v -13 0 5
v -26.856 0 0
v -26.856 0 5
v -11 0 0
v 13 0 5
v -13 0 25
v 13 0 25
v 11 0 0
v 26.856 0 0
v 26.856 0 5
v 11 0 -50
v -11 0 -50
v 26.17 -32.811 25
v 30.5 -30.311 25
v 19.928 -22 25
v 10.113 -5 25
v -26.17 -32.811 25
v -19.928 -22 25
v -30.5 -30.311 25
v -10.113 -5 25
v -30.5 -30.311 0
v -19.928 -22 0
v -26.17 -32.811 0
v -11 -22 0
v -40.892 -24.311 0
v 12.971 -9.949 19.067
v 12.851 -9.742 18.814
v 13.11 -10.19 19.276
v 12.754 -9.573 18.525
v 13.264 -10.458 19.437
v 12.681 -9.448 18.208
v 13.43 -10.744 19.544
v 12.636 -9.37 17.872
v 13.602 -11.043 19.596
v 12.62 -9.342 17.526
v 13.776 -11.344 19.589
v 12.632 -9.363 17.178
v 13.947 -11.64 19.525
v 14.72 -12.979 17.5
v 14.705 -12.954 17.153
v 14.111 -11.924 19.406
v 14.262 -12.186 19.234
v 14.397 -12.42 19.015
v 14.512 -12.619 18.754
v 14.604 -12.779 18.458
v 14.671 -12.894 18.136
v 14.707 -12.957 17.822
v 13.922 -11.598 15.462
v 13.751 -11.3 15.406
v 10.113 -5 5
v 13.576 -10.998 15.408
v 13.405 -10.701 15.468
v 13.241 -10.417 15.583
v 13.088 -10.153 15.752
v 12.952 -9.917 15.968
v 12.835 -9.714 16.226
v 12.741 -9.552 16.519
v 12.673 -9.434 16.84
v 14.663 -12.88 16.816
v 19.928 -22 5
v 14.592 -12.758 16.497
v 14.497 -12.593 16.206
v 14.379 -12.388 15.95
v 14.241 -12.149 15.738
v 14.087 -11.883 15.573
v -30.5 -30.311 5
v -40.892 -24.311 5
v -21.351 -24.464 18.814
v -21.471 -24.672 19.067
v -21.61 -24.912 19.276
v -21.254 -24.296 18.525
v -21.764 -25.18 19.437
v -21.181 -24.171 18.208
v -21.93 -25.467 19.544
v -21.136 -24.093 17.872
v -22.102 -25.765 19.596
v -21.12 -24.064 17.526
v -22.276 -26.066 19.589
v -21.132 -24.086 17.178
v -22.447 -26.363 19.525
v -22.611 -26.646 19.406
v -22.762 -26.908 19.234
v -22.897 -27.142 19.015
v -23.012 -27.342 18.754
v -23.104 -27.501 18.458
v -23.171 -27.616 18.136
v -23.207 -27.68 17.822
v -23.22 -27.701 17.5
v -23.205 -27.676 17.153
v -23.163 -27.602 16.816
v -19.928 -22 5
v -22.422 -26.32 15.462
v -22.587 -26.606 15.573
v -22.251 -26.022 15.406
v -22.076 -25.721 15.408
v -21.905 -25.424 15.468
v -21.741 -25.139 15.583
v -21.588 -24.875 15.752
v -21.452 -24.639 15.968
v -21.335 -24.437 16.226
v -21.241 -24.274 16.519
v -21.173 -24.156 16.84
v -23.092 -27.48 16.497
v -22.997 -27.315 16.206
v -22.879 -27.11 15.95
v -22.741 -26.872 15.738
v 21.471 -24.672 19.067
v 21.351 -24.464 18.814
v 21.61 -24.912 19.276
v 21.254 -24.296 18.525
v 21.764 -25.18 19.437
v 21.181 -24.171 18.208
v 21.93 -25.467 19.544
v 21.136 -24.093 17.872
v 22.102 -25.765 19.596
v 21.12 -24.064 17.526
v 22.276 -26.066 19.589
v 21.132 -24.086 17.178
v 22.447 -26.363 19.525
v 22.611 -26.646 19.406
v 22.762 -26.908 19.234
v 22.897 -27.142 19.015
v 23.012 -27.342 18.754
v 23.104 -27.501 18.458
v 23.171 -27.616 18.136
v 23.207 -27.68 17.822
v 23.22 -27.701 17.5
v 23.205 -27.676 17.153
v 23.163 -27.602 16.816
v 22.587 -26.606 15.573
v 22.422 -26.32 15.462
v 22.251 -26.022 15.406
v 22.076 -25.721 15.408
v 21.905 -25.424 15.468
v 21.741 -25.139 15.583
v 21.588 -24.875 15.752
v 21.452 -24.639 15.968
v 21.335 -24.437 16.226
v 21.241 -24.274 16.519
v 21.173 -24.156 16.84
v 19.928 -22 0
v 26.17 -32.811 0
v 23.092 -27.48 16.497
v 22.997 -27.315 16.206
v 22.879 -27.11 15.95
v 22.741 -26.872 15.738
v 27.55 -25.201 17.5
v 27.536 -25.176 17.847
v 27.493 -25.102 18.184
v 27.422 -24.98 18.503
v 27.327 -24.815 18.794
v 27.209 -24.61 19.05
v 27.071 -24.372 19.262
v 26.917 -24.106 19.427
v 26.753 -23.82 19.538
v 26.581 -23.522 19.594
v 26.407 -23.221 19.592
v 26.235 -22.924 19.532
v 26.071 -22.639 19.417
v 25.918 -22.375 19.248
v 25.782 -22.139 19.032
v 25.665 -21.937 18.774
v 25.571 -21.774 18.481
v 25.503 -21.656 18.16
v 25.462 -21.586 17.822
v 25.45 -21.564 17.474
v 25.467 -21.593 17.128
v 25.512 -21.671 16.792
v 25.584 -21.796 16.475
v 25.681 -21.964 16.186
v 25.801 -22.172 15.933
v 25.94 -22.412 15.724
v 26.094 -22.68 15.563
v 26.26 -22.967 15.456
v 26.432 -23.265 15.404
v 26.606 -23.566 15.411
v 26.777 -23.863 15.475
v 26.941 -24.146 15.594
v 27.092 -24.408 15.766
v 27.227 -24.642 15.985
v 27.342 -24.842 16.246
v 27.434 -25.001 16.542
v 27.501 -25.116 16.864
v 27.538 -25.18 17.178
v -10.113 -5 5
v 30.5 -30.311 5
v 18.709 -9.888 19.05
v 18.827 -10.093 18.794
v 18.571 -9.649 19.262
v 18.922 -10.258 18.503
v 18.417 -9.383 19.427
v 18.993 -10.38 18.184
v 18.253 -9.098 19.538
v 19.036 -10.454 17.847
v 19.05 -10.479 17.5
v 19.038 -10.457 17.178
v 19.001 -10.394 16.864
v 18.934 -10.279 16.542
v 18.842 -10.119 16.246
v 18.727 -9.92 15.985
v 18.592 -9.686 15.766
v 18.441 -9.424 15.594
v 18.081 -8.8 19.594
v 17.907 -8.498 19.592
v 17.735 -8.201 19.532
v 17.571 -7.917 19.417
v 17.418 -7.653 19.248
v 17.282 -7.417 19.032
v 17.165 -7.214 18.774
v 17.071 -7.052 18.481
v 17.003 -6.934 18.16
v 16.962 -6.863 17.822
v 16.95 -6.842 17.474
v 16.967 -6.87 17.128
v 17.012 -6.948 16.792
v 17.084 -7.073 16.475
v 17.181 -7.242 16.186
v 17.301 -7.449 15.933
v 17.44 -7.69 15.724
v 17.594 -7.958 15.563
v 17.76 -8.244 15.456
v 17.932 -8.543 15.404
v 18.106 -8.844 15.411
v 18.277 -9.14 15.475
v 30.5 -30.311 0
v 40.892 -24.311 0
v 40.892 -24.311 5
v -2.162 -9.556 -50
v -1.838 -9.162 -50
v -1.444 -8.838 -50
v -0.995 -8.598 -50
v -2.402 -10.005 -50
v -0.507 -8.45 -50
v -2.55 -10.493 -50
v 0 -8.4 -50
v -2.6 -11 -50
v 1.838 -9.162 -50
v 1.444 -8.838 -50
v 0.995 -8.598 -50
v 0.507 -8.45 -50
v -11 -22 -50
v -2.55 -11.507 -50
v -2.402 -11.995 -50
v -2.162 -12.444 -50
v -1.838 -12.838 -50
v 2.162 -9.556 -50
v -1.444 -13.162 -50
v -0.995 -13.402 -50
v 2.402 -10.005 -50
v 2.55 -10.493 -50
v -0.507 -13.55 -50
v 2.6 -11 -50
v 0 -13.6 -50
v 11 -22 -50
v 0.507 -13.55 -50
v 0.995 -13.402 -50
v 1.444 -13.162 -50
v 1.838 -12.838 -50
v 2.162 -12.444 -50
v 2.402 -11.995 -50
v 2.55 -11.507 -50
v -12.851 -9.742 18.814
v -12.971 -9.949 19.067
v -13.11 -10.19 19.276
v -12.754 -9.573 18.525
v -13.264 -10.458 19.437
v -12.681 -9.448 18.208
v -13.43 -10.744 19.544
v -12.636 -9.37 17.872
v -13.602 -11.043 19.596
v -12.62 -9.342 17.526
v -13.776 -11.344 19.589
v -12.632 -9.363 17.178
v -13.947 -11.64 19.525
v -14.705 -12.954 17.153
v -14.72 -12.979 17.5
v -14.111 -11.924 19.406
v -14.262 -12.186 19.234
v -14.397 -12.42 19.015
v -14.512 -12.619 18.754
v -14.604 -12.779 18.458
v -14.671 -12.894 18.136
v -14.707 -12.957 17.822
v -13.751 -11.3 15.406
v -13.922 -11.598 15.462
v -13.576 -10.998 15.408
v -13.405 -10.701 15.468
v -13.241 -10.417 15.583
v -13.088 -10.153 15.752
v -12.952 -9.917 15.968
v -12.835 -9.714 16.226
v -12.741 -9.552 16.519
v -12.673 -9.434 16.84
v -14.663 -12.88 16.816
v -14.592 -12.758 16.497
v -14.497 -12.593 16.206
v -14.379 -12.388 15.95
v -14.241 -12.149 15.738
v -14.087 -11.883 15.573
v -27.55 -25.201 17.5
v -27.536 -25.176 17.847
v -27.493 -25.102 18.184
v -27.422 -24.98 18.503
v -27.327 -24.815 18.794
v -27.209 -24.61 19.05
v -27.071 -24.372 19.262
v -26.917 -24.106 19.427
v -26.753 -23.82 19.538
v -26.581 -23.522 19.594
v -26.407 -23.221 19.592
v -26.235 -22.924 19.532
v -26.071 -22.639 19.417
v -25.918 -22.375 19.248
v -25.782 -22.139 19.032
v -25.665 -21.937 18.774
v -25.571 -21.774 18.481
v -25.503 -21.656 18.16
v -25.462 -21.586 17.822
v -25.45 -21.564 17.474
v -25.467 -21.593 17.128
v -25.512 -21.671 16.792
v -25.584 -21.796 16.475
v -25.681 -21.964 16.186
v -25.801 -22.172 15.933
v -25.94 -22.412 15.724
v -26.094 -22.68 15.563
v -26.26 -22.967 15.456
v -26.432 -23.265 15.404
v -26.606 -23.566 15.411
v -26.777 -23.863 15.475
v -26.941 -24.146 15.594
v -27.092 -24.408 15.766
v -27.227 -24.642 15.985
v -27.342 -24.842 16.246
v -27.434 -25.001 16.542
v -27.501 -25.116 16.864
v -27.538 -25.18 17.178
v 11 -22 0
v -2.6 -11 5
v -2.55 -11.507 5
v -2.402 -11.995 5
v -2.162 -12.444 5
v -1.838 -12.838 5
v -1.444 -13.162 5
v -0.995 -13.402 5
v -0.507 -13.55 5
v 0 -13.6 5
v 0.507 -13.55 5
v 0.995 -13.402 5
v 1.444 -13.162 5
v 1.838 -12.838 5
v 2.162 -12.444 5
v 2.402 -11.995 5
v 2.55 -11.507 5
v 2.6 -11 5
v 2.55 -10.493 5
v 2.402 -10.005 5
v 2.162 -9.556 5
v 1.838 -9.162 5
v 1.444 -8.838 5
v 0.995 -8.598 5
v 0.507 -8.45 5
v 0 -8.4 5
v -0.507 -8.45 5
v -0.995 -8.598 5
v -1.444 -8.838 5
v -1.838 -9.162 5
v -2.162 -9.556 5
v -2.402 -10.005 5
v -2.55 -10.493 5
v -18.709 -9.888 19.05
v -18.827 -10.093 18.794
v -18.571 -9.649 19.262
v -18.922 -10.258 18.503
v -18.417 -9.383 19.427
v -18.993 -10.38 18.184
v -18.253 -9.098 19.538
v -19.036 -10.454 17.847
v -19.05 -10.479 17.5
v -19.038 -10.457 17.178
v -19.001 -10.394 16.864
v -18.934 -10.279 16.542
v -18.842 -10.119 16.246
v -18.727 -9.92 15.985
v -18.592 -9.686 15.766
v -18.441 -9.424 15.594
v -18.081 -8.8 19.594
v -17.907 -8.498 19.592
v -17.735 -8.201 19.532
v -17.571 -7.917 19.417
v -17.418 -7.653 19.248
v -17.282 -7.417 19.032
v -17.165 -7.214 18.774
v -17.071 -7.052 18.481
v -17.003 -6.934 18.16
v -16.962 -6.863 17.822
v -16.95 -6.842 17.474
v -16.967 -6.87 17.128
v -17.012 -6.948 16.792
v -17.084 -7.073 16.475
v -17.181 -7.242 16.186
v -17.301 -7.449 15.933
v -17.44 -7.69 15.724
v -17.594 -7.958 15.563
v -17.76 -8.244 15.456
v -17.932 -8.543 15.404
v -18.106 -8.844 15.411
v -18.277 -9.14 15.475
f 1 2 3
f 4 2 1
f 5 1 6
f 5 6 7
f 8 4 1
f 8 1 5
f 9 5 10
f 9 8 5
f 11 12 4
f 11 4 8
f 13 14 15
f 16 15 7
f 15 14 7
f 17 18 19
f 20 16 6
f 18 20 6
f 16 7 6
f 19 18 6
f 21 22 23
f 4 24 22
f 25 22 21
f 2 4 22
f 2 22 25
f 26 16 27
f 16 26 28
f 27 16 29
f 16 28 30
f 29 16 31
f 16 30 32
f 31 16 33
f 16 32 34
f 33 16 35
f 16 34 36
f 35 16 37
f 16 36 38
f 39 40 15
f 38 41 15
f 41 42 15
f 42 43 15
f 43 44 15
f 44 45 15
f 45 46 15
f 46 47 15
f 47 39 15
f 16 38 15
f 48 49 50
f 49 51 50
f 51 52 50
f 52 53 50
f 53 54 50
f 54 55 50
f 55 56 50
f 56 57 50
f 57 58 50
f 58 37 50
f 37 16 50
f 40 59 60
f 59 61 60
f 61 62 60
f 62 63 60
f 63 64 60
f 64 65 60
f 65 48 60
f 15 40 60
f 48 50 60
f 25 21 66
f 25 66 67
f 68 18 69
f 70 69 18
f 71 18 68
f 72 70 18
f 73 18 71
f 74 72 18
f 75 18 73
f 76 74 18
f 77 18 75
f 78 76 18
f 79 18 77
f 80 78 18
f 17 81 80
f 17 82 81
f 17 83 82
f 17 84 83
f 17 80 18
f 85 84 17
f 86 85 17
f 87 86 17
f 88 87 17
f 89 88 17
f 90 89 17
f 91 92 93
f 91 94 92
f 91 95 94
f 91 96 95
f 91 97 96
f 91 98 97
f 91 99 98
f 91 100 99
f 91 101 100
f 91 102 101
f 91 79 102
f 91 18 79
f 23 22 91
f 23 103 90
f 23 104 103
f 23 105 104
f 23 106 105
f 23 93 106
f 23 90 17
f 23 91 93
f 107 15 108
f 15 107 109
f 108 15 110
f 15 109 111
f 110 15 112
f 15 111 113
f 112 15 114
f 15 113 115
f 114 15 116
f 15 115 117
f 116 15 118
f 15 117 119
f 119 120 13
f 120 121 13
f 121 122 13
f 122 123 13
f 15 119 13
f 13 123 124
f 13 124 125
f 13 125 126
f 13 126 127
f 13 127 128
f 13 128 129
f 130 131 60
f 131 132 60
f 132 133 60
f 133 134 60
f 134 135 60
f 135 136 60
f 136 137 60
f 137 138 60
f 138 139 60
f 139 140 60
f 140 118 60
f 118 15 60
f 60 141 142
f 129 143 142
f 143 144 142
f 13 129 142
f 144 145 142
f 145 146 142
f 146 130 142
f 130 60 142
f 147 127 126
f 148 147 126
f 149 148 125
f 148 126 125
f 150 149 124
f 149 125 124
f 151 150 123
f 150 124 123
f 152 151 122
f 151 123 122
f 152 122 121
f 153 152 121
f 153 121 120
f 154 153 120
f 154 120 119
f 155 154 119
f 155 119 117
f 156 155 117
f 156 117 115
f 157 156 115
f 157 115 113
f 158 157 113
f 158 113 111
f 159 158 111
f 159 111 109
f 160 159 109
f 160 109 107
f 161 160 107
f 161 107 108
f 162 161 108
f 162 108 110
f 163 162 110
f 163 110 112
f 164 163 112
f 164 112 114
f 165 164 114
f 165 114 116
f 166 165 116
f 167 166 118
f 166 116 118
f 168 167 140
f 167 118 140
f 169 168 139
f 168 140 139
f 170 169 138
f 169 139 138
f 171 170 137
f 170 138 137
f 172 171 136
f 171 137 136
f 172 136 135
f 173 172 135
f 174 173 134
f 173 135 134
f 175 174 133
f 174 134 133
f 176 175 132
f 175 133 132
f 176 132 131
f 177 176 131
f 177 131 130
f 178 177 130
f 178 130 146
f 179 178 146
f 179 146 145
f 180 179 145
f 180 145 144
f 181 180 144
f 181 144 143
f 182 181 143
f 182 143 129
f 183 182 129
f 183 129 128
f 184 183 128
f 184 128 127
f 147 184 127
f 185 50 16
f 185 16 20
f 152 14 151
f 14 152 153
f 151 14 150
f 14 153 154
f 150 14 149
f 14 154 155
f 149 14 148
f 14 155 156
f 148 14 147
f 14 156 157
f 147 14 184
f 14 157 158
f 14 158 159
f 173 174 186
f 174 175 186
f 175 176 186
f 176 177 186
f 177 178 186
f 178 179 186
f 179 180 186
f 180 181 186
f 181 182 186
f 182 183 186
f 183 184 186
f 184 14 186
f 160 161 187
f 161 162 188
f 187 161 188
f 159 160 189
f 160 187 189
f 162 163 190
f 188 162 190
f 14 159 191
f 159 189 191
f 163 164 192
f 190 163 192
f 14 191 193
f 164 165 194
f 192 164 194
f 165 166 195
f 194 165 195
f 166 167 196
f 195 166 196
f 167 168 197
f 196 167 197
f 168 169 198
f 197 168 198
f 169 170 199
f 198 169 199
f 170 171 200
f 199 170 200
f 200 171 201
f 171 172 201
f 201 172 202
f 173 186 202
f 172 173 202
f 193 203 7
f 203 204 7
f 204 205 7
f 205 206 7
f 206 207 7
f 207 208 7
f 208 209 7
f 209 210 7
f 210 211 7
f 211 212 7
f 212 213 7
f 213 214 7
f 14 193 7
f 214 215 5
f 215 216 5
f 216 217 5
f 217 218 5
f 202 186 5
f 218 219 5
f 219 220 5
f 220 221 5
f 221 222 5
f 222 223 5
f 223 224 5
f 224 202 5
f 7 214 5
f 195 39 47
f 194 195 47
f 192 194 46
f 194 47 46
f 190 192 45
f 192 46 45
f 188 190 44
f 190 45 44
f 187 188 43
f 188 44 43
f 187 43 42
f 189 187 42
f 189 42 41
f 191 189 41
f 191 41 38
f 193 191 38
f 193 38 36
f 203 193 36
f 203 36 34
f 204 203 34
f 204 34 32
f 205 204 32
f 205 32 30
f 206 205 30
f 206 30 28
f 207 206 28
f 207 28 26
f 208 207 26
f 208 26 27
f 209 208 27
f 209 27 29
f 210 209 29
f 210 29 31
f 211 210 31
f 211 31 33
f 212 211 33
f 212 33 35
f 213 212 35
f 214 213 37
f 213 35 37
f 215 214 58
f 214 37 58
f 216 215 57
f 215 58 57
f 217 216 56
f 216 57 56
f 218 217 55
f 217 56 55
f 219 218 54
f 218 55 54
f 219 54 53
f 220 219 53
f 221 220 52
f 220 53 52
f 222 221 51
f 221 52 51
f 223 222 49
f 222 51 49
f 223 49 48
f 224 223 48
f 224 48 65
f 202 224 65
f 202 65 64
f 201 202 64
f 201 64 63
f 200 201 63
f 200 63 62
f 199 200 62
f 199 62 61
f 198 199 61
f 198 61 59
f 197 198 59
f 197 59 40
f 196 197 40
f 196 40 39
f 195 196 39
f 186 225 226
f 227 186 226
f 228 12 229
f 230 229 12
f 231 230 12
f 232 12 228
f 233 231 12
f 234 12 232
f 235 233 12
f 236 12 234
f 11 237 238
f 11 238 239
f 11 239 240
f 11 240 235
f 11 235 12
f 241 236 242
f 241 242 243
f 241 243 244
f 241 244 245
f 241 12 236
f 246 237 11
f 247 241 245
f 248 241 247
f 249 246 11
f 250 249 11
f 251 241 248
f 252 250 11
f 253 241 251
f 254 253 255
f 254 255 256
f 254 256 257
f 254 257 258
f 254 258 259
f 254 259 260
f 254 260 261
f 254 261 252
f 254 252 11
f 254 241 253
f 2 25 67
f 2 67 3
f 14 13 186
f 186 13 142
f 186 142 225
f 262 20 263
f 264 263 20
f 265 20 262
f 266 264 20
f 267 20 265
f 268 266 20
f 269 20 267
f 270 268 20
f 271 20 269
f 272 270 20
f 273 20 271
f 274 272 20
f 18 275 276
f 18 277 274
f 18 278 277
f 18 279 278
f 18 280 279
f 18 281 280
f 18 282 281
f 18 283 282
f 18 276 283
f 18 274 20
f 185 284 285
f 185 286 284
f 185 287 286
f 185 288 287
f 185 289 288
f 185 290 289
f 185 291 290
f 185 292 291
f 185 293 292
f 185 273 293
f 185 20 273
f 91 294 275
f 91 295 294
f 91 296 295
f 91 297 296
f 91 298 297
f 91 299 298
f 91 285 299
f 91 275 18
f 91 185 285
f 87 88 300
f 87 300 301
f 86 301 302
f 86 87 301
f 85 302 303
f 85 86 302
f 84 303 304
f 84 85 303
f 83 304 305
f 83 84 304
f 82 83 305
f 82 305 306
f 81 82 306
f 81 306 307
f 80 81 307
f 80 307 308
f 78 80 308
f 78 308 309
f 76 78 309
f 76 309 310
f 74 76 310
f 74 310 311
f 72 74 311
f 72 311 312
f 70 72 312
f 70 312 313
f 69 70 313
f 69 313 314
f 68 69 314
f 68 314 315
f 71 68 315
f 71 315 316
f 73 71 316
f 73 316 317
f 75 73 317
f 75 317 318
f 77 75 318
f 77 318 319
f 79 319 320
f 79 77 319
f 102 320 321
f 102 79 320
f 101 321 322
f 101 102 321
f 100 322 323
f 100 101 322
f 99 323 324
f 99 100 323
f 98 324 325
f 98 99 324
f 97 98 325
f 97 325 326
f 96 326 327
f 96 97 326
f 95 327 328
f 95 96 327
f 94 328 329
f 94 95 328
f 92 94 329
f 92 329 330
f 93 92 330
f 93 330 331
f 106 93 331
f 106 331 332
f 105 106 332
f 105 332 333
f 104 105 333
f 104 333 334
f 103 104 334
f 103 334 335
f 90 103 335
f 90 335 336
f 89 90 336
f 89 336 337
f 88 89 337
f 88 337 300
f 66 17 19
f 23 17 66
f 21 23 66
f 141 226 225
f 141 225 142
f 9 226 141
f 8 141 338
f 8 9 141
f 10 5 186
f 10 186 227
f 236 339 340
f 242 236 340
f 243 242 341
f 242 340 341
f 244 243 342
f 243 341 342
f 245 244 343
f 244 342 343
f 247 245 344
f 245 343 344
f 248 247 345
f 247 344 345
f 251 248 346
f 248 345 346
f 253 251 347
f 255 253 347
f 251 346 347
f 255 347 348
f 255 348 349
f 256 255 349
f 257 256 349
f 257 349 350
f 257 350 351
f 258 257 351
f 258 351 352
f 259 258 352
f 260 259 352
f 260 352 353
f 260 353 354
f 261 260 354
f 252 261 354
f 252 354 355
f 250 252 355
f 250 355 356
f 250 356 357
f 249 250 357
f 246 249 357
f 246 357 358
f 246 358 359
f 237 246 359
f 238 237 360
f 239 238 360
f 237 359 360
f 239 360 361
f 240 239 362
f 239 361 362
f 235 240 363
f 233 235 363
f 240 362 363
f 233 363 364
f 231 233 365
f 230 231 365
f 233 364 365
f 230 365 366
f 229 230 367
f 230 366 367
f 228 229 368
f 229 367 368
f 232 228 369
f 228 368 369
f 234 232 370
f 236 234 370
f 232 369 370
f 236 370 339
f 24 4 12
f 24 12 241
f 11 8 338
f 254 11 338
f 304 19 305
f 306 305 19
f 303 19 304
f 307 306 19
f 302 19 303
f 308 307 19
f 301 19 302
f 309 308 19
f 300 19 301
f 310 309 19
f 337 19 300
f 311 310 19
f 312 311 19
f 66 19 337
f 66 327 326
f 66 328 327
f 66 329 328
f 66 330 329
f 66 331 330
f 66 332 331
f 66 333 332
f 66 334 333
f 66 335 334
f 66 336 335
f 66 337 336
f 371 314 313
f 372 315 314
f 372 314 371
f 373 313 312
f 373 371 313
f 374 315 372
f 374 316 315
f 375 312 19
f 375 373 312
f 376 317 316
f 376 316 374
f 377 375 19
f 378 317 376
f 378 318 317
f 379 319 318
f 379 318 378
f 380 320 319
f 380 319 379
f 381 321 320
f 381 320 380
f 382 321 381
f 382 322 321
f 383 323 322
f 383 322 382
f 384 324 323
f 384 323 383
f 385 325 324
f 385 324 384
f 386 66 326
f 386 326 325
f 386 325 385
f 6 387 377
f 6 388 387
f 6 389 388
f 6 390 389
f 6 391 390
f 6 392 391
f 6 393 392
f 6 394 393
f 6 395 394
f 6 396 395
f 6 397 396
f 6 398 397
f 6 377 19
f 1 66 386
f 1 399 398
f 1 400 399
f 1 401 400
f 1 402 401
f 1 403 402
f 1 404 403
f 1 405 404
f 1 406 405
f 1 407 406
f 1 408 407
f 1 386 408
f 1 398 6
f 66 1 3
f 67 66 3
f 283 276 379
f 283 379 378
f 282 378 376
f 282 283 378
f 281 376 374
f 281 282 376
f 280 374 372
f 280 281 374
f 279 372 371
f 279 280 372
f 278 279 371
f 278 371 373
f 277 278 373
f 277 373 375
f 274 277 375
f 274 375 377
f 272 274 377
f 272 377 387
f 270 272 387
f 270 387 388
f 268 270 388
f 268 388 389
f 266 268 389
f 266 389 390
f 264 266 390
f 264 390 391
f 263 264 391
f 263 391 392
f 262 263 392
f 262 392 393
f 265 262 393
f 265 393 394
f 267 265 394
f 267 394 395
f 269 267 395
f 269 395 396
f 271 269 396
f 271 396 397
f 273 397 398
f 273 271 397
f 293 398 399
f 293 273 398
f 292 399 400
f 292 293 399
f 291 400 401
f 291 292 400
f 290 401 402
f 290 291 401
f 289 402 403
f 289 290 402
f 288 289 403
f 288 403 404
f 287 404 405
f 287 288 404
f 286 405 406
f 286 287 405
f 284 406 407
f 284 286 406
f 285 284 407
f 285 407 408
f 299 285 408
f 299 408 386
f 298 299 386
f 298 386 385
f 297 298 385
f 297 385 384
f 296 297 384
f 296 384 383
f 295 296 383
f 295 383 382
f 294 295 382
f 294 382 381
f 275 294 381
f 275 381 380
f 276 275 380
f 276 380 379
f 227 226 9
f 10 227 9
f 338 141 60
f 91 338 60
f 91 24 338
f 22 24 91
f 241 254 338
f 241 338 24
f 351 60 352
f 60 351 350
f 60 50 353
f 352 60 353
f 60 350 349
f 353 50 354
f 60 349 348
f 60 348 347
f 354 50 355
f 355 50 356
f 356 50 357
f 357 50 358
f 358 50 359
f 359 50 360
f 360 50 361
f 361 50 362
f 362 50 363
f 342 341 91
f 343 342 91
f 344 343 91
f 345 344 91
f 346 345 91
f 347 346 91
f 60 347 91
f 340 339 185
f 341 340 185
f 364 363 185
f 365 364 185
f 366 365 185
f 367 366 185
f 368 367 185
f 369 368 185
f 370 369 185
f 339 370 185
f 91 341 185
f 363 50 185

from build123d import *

# Parameters (mm, degrees)
F1_DEPTH = 5
F2_DEPTH = 25
F4_D     = 4.2
F6_W     = 22
F6_H     = 22
F7_DEPTH = 50
F9_D     = 5.2


with BuildPart() as f1:
    # F0 (on Top) → F1 (new body)
    with BuildSketch(Plane.XY):
        Polygon((10.113249, -5), (0, -5), (0, -22), (19.928203, -22), align=None)
        Polygon((13, 0), (0, 0), (0, -5), (10.113249, -5), (19.928203, -22), (26.169873, -32.810889), (30.5, -30.310889), align=None)
        Polygon((26.856406, 0), (13, 0), (30.5, -30.310889), (40.892305, -24.310889), align=None)
    extrude(amount=F1_DEPTH)

    # F0 (on Top) → F2 (join)
    with BuildSketch(Plane.XY):
        Polygon((13, 0), (0, 0), (0, -5), (10.113249, -5), (19.928203, -22), (26.169873, -32.810889), (30.5, -30.310889), align=None)
    extrude(amount=F2_DEPTH)

    # F4 (through all)
    with Locations(Plane(origin=(9.75, 5.629165, 0), x_dir=(-0.5, 0.866025, 0), z_dir=(0.866025, 0.5, 0))):
        with Locations((-33.5, 17.5), (-16.5, 17.5)):
            Hole(F4_D / 2)

    # F5: F1 across plane


with BuildPart() as f1_1:
    add(f1.part)
    add(f1.part.mirror(Plane.YZ))

    # F6 (on face) → F7 (join)
    with BuildSketch(Plane(origin=(0, 0, 0), x_dir=(1, 0, 0), z_dir=(0, 0, -1))):
        with Locations((0, 11)):
            Rectangle(F6_W, F6_H)
    extrude(amount=F7_DEPTH)

    # F9 (through all)
    with Locations(Plane(origin=(0, 0, -50), x_dir=(1, 0, 0), z_dir=(0, 0, -1))):
        with Locations((0, 11)):
            Hole(F9_D / 2)


solid = f1_1.part
